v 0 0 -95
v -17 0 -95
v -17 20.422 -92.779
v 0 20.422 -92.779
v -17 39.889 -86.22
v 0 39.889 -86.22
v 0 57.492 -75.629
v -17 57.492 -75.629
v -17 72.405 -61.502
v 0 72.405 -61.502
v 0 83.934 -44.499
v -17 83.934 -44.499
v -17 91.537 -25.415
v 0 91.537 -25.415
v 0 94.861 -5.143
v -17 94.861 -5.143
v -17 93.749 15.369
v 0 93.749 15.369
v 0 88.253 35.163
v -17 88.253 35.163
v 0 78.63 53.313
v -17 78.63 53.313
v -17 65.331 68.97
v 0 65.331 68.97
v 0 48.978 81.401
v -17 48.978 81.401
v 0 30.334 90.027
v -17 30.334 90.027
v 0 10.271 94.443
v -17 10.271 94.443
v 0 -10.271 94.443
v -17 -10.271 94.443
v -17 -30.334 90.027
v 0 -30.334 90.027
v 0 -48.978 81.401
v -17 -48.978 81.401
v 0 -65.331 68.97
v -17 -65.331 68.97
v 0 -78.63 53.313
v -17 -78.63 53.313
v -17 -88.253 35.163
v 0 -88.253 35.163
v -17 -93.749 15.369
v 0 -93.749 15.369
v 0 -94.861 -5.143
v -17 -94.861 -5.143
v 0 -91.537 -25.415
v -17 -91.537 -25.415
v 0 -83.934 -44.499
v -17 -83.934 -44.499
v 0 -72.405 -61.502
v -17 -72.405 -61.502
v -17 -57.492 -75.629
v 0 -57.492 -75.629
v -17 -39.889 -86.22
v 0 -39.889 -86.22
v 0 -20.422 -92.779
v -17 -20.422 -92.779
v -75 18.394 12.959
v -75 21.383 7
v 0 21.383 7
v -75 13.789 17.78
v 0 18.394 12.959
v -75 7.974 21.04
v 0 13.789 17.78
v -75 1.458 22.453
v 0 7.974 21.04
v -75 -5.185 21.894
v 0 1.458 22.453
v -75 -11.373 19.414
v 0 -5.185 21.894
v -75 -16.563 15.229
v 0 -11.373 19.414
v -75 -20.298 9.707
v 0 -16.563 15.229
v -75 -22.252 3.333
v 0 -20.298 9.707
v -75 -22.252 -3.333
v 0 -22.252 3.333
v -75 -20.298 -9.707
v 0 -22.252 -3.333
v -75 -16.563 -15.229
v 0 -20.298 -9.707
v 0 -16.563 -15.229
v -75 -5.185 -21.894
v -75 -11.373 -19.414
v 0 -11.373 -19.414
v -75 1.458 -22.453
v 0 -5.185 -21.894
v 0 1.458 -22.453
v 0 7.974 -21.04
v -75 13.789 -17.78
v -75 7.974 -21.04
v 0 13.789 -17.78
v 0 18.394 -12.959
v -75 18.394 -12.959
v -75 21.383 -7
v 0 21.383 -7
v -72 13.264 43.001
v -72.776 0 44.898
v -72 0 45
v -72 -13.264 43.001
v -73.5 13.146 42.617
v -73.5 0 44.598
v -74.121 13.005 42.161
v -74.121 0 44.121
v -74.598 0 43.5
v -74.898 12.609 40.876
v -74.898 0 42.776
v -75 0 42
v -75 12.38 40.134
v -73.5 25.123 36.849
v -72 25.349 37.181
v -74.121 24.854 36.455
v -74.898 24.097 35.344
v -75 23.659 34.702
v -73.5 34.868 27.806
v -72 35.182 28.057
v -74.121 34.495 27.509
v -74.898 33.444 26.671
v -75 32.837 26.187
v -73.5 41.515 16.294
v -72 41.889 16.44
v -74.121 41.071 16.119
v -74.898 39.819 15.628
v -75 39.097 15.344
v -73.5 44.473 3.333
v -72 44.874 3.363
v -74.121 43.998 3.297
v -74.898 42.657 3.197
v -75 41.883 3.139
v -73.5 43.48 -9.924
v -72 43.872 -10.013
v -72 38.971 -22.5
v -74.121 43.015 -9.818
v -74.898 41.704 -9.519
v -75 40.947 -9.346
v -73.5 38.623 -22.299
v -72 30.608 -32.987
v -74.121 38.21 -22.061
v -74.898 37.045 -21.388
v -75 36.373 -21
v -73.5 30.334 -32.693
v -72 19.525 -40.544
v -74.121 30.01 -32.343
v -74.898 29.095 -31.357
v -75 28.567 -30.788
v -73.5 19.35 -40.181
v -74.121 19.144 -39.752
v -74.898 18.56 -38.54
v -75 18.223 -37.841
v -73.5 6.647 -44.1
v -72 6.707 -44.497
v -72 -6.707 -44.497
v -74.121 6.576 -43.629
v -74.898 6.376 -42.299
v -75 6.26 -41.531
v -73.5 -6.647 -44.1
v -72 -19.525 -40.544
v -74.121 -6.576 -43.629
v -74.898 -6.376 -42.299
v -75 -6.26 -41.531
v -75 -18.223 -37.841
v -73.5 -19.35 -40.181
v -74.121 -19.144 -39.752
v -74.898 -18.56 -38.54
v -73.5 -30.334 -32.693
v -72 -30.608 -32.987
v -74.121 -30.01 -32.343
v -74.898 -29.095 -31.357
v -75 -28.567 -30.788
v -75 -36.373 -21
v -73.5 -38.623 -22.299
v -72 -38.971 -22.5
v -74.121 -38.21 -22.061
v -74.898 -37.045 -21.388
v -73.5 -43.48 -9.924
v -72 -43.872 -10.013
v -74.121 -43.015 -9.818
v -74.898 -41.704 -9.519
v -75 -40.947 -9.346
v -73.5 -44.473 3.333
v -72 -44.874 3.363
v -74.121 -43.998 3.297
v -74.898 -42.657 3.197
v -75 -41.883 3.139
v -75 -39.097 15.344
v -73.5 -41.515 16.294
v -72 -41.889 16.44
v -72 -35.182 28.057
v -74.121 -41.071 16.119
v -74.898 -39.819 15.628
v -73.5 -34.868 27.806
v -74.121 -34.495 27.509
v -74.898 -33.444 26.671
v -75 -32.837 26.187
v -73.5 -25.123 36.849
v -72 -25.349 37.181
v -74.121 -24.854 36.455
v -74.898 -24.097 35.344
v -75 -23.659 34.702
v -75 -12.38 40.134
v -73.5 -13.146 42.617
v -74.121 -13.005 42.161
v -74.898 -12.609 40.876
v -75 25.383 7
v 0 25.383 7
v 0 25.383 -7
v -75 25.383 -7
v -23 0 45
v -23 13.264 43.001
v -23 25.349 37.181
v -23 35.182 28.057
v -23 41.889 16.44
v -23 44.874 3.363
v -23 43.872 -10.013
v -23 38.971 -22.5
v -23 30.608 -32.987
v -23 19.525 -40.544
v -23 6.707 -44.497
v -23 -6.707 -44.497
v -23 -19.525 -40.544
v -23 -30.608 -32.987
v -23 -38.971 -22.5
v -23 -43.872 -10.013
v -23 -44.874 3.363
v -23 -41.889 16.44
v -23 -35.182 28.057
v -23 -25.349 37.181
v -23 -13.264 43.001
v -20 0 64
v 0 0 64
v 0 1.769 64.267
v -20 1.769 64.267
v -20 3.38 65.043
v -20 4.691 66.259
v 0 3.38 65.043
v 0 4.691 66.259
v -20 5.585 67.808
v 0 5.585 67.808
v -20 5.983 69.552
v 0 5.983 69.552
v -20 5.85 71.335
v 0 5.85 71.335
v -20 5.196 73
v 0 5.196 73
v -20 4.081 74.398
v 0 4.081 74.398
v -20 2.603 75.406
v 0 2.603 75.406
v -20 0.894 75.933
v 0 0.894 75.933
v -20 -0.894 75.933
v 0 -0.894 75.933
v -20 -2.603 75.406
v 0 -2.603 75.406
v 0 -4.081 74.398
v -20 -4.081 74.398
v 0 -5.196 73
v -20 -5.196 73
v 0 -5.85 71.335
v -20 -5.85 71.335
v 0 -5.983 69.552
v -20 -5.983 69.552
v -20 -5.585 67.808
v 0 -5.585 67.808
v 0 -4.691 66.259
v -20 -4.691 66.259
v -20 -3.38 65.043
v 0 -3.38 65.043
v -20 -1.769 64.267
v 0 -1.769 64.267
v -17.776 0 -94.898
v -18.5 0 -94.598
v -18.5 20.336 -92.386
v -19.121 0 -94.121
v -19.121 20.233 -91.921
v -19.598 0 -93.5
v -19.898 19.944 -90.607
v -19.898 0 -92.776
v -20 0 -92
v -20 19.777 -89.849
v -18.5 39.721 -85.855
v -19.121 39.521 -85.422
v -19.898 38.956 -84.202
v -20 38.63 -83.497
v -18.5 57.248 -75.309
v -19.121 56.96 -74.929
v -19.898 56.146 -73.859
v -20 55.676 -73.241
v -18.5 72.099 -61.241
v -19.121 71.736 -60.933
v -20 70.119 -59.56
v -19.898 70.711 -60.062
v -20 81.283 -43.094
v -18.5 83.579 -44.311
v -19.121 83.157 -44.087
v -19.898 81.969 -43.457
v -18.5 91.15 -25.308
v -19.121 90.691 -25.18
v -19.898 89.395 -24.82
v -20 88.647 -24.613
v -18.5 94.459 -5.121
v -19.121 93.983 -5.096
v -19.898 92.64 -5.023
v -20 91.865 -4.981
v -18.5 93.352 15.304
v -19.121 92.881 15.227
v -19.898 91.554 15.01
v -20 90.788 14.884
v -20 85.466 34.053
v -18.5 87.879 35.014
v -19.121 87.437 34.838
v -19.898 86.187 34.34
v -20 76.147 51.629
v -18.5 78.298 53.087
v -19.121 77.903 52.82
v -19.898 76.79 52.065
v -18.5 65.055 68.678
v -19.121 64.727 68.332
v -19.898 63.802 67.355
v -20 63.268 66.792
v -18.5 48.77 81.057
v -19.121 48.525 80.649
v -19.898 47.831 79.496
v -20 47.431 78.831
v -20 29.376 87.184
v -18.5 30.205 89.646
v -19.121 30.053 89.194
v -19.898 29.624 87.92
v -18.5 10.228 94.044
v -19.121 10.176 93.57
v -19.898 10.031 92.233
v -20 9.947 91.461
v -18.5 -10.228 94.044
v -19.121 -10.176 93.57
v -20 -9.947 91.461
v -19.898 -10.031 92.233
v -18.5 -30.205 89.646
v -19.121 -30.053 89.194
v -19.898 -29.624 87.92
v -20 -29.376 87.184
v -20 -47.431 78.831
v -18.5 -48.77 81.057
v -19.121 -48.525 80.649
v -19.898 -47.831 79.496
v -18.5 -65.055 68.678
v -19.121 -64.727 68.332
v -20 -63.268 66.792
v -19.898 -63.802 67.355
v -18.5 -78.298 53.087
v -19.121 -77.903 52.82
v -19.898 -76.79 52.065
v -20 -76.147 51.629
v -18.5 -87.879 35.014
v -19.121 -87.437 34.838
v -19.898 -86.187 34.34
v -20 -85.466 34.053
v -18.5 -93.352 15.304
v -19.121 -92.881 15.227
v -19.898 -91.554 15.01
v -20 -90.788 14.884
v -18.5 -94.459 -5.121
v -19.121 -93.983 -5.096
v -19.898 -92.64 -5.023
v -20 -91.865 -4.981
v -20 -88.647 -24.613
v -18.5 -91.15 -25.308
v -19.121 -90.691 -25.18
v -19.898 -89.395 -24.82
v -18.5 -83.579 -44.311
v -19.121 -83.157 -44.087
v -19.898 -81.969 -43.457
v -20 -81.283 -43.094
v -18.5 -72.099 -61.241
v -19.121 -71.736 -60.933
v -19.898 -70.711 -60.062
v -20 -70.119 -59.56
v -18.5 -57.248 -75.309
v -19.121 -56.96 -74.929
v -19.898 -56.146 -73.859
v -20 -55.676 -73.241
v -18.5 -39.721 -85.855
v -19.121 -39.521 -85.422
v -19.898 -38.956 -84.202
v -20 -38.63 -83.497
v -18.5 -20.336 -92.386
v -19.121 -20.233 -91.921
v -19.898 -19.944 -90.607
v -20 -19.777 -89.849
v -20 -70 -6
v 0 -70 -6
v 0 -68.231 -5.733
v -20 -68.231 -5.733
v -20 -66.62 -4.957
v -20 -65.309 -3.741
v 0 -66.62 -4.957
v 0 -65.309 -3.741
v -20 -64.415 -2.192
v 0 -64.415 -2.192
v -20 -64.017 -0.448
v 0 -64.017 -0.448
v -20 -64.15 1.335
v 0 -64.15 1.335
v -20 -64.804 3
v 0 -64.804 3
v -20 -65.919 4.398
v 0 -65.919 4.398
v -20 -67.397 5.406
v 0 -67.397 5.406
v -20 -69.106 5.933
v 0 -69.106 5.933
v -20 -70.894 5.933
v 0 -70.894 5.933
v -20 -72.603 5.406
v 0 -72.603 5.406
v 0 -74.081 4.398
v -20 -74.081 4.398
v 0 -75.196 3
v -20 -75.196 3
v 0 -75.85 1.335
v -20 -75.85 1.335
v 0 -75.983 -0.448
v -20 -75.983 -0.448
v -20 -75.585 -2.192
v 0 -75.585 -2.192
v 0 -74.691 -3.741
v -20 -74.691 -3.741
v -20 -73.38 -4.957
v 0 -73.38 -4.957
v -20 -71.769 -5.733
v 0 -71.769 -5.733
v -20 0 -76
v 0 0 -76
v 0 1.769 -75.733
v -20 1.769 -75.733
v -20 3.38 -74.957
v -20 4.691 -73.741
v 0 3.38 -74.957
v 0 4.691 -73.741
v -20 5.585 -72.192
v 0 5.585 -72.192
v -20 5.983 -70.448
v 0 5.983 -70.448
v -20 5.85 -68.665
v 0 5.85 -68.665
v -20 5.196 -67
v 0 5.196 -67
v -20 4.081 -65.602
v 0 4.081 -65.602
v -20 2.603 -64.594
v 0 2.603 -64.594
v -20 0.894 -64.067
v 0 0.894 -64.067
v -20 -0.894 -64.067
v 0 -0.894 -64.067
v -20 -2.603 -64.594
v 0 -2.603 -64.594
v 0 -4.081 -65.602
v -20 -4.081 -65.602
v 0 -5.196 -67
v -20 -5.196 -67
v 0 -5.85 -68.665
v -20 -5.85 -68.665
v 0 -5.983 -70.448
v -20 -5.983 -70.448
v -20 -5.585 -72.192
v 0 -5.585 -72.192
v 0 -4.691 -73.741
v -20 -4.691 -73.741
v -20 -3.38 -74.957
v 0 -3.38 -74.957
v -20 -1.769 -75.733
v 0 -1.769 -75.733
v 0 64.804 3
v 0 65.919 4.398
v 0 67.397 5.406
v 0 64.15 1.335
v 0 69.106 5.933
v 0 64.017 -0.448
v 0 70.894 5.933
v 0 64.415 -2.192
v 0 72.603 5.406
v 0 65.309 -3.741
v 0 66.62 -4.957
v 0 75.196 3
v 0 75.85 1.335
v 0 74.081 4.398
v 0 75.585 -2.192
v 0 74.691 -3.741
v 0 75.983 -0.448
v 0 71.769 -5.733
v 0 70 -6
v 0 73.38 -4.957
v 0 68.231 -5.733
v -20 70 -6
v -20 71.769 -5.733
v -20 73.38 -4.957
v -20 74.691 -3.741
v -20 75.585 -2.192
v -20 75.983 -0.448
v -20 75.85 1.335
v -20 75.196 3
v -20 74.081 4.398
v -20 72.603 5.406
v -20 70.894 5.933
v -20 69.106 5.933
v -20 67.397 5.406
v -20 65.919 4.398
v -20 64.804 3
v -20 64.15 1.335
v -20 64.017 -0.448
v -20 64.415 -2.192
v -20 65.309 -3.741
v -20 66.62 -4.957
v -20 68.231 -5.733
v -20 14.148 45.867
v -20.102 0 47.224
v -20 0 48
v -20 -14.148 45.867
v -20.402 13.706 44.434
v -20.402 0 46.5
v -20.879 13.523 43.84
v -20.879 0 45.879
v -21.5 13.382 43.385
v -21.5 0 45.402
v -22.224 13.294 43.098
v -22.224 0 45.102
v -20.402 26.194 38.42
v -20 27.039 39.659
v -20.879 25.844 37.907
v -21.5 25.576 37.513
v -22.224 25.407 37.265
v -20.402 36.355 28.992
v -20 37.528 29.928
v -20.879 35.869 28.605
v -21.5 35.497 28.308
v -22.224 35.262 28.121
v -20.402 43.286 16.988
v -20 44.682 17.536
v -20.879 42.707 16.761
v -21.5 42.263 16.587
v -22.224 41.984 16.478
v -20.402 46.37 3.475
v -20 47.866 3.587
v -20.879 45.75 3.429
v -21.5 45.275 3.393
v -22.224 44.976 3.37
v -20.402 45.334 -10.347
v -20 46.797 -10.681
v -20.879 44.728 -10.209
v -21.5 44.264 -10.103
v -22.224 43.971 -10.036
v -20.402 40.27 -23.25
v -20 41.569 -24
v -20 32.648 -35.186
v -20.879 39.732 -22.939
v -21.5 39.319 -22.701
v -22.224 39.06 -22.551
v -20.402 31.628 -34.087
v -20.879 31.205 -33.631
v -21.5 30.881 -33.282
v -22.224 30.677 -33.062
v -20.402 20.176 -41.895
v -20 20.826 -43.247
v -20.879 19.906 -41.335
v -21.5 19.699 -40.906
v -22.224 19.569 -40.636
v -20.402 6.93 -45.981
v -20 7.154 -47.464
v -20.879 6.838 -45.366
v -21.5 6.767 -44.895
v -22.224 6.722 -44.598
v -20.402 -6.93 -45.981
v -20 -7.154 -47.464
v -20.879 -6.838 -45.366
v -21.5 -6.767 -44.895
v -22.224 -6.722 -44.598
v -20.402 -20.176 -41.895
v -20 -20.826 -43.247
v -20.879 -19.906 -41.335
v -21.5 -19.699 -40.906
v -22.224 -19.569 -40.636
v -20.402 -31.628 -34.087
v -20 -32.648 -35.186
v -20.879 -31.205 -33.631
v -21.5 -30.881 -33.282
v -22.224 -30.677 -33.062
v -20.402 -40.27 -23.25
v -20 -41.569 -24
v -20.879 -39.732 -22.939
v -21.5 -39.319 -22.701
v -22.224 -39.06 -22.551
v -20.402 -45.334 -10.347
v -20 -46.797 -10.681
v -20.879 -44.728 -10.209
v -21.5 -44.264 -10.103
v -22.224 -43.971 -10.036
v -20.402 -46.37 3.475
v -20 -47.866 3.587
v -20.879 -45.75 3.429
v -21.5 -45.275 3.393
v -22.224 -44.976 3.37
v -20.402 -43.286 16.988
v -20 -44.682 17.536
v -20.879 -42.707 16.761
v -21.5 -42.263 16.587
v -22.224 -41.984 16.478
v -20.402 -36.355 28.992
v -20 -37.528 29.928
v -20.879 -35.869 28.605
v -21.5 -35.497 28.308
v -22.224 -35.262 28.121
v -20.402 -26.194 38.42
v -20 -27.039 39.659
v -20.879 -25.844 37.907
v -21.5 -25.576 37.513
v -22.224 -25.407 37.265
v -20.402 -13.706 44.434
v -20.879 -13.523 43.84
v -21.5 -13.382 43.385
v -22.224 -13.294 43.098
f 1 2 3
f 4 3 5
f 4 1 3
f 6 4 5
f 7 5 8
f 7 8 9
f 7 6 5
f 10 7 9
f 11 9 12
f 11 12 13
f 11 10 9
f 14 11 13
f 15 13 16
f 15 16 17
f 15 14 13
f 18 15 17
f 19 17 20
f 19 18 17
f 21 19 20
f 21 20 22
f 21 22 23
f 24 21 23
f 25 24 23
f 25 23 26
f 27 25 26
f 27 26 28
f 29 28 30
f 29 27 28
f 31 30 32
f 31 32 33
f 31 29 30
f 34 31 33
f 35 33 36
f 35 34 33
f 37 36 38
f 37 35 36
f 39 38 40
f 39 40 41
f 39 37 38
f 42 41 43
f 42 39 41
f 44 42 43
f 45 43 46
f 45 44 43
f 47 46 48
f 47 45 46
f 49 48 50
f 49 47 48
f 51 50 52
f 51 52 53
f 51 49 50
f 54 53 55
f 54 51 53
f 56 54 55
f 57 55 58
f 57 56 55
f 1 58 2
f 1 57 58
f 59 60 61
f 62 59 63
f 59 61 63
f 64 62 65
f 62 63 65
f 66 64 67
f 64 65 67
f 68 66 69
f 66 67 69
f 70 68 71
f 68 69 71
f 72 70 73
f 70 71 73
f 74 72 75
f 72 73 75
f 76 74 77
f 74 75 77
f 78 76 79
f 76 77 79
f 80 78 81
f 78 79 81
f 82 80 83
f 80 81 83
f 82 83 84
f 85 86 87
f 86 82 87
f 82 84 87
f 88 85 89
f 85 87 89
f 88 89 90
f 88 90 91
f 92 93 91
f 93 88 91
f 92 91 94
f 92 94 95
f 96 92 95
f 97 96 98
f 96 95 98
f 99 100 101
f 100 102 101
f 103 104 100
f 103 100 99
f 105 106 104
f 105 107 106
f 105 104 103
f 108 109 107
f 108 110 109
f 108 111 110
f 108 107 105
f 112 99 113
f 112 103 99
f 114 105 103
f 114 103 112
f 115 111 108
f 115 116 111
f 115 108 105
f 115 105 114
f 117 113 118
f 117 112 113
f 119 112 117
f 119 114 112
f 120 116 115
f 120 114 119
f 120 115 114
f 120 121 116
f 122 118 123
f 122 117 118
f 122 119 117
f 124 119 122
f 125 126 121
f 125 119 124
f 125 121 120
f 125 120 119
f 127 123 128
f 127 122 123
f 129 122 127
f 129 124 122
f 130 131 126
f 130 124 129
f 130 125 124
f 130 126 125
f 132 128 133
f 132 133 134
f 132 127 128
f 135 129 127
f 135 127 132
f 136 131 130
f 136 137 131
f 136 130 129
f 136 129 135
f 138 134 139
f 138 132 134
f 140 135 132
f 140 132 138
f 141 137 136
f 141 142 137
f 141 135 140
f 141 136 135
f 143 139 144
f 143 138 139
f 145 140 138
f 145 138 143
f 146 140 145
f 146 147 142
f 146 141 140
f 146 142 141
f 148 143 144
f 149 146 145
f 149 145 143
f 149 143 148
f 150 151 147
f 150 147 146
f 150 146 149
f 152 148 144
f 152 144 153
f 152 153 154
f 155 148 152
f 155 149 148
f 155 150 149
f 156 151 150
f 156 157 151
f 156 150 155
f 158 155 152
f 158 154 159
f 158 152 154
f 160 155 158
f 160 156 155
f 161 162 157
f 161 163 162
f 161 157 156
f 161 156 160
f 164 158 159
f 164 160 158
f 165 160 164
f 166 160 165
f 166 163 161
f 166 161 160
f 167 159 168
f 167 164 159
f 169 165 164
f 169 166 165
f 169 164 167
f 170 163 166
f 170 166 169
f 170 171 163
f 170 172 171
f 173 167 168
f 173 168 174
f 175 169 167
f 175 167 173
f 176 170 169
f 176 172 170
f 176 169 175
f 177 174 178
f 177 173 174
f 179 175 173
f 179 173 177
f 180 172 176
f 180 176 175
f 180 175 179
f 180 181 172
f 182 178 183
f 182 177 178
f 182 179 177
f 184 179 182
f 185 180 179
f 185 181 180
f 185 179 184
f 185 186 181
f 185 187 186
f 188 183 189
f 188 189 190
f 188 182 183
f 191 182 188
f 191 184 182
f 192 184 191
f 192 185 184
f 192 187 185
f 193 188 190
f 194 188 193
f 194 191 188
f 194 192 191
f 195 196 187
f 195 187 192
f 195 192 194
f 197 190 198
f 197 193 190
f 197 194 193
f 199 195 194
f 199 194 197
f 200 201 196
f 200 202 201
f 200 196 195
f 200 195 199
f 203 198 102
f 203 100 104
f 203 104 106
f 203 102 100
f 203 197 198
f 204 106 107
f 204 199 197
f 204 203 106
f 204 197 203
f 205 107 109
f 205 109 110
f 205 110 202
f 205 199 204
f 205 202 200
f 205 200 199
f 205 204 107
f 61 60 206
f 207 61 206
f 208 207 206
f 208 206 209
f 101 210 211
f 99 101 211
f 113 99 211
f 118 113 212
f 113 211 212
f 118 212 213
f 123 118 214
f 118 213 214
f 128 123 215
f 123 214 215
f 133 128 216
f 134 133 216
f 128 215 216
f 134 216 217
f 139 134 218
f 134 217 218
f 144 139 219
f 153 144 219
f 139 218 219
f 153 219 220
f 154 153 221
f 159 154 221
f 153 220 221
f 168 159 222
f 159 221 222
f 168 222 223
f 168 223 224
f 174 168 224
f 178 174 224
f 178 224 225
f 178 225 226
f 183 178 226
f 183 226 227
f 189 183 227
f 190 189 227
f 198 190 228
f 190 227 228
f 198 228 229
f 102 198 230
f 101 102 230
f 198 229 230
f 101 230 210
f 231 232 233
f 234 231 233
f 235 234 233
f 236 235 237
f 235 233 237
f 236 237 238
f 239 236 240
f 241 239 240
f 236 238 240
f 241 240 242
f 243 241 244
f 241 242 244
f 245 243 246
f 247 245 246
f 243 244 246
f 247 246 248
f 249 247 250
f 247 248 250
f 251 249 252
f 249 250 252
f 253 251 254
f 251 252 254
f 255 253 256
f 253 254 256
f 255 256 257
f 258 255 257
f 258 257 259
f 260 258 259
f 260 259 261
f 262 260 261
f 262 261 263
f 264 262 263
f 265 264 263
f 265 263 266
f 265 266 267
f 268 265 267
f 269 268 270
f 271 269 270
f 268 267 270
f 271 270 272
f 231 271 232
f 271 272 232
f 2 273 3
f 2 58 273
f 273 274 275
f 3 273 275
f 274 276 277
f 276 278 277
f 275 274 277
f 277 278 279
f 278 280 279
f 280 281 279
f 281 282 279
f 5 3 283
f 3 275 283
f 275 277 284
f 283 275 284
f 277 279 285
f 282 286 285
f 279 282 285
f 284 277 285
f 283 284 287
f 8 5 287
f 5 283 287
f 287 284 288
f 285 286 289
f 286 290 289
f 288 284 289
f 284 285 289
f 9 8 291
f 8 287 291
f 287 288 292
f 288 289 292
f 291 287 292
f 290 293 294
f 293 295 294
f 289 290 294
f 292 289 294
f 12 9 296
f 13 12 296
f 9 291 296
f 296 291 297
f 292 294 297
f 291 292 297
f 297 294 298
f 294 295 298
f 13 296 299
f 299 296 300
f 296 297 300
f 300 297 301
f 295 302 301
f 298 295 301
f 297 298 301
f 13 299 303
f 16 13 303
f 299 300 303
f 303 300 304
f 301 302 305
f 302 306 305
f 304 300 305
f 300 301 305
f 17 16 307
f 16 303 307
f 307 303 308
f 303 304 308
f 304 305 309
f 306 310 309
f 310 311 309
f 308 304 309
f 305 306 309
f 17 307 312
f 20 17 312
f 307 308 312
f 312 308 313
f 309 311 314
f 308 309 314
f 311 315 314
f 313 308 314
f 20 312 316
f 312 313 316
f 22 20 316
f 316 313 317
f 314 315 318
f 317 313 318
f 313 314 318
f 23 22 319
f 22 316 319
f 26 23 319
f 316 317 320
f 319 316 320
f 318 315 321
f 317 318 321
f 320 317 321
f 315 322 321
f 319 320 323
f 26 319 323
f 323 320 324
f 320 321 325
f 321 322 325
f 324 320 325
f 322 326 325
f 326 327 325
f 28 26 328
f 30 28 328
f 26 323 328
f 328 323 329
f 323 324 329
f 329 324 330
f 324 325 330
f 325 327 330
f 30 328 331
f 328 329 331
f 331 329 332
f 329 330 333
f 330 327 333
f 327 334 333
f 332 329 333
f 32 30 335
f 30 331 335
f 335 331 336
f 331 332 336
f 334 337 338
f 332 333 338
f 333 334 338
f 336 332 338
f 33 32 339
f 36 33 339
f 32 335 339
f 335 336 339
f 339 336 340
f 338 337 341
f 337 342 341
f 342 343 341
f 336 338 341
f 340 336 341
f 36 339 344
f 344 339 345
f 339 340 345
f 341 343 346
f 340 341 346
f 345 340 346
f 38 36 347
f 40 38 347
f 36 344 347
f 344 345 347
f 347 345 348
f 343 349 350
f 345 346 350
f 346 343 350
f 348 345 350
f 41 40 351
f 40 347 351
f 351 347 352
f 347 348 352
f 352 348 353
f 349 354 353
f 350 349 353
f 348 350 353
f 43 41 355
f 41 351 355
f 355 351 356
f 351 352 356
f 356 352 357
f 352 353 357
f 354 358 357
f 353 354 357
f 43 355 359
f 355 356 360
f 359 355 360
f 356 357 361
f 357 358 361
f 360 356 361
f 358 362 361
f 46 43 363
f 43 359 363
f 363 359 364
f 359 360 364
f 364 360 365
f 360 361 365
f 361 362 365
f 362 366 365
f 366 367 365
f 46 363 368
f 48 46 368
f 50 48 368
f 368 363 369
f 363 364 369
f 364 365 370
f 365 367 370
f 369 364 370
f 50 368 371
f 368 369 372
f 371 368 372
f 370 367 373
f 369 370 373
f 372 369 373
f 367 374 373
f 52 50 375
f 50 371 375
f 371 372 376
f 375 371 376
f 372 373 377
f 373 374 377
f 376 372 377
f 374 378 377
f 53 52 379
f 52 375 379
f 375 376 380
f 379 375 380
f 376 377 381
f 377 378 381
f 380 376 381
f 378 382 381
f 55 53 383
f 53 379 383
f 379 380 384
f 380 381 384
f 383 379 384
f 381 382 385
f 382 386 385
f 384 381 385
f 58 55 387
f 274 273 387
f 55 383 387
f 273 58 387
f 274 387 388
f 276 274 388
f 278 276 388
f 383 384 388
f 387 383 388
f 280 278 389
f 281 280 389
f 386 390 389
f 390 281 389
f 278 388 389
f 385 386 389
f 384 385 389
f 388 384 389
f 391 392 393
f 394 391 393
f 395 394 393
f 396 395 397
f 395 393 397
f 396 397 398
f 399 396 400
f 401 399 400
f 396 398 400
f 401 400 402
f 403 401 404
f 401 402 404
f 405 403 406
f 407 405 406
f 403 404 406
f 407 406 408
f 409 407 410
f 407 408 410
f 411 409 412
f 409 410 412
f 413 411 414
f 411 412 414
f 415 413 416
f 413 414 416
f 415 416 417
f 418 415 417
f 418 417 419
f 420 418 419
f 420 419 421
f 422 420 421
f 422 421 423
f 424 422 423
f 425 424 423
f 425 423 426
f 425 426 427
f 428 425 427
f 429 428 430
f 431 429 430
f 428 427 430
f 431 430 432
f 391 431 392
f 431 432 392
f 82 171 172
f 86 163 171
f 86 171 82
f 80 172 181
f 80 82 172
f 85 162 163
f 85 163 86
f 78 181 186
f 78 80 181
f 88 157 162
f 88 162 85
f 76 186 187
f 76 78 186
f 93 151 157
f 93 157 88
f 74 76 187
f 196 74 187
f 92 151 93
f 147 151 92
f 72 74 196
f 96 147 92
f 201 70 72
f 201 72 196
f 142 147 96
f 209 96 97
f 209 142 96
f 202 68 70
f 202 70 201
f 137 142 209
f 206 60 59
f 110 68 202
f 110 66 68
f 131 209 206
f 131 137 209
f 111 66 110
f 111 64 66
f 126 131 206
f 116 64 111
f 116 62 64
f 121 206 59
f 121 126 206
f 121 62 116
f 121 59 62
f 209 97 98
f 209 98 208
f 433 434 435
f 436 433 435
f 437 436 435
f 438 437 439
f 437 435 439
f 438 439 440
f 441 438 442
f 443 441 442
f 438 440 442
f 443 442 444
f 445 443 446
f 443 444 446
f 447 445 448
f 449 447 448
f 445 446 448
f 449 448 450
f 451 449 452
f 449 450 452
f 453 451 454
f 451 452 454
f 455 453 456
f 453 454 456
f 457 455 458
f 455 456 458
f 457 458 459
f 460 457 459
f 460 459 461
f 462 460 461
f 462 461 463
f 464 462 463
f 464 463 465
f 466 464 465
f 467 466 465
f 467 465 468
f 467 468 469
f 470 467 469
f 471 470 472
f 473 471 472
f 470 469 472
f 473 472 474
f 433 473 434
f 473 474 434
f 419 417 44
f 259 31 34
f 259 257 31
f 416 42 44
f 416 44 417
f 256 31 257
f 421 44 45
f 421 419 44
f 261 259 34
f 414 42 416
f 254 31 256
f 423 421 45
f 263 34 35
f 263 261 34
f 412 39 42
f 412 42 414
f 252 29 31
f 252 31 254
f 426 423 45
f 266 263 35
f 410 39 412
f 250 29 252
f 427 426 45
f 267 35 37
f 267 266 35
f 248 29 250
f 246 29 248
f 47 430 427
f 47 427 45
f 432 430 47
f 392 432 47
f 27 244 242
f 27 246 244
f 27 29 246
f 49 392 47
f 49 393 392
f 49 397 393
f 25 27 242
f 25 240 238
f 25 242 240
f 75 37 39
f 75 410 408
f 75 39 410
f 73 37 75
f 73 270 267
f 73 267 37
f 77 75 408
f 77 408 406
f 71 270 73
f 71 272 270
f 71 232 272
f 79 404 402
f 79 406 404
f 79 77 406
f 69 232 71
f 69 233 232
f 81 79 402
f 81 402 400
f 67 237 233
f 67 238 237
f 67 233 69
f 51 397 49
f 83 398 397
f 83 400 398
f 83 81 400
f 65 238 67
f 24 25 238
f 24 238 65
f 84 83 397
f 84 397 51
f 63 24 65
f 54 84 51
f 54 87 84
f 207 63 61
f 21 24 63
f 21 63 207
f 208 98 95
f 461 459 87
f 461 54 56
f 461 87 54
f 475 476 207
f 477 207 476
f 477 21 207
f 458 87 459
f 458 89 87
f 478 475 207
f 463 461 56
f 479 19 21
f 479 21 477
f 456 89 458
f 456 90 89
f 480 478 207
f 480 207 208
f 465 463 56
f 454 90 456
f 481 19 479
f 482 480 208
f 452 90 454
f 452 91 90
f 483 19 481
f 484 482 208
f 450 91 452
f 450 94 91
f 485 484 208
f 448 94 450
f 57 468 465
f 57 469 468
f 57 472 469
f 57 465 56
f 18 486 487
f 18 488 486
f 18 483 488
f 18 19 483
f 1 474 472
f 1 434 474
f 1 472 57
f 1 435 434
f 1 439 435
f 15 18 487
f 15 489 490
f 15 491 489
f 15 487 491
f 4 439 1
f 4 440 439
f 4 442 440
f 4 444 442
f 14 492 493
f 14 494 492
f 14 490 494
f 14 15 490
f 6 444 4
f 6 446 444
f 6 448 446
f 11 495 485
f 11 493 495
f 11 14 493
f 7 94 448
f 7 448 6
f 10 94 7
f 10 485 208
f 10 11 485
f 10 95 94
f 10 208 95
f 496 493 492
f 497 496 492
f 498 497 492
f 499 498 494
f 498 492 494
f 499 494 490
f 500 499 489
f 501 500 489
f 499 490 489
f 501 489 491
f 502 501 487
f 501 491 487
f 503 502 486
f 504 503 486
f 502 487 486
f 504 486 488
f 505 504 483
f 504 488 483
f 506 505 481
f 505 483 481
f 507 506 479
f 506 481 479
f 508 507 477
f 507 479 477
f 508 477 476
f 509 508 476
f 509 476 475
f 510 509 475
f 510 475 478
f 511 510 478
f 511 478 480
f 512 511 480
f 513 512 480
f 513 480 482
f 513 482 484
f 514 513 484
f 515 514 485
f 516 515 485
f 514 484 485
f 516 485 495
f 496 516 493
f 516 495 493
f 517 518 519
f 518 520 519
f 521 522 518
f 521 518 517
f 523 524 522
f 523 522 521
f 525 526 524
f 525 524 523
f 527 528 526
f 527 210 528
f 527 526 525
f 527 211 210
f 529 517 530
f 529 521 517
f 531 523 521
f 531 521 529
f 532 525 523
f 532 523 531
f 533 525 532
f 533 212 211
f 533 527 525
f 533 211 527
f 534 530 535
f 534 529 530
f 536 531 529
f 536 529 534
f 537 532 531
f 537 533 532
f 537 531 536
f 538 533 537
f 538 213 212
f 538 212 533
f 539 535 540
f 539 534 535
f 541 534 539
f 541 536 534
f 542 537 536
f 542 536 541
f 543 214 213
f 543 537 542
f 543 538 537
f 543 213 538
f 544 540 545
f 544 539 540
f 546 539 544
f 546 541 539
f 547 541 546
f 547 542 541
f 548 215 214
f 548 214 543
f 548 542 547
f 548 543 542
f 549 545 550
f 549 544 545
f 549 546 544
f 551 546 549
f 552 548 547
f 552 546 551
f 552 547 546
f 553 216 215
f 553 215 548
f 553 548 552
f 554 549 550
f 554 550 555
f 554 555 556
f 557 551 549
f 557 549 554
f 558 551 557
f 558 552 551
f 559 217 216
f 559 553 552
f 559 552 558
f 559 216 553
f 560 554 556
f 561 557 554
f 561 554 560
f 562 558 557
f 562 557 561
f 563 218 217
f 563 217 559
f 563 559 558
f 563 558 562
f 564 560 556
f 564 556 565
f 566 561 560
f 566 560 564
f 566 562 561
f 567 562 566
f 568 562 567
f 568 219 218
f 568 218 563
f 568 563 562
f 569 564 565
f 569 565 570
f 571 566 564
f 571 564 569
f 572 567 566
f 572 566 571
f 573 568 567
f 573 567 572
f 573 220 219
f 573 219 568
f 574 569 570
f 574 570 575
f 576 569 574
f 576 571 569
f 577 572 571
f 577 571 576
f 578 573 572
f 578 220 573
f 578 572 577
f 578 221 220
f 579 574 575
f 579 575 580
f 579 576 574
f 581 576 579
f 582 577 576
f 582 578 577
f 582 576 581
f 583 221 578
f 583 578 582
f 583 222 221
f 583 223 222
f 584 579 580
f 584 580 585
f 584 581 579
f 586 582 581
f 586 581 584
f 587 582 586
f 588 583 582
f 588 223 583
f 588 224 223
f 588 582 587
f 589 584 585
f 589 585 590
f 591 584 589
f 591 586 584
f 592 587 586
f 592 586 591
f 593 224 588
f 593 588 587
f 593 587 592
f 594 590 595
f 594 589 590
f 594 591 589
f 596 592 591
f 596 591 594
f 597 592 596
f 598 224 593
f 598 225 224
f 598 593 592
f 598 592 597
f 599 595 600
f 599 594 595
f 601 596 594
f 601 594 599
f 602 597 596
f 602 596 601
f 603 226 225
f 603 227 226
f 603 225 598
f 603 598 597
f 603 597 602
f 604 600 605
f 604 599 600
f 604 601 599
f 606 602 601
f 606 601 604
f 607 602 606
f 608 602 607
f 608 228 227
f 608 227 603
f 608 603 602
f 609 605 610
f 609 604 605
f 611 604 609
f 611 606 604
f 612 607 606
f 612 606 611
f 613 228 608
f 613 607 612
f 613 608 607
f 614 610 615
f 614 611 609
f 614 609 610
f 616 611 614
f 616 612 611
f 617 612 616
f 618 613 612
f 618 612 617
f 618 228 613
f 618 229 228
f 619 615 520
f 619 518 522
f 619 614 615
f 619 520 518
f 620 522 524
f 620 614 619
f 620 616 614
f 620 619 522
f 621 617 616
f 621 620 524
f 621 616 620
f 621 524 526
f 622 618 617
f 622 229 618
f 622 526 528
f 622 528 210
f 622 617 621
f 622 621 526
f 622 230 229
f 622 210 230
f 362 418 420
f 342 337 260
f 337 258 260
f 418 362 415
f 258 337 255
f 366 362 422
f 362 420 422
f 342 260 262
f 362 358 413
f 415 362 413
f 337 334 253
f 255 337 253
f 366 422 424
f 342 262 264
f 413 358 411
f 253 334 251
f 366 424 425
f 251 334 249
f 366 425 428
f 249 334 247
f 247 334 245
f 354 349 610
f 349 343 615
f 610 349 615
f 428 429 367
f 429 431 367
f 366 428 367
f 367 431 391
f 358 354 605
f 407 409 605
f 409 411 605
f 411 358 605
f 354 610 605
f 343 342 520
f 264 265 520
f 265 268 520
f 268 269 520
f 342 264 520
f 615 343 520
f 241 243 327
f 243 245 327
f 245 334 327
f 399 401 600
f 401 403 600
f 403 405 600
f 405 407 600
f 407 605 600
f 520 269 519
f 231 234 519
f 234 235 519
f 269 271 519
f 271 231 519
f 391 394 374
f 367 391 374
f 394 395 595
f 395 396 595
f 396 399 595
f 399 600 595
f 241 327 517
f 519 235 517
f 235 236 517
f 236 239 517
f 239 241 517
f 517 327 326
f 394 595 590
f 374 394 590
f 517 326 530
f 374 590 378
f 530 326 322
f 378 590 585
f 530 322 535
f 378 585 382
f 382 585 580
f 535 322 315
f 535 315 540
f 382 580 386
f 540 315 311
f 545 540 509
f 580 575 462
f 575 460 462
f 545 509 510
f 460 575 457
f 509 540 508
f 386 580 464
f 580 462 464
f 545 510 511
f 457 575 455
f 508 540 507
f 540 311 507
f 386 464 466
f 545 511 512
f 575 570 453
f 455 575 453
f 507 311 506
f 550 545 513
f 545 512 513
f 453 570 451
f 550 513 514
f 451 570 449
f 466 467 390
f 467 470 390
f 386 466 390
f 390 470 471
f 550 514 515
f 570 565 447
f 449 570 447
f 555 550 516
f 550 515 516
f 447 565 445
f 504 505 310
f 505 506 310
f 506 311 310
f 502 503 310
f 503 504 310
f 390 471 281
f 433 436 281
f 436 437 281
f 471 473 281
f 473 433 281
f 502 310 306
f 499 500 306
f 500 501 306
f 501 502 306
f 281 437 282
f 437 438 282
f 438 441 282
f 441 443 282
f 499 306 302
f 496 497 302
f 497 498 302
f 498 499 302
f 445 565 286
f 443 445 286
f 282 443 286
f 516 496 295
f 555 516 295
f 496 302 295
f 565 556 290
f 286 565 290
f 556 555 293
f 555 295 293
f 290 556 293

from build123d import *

# Parameters (mm, degrees)
SKETCH1_R           = 95
BOSS_EXTRUDE1_DEPTH = 20
SKETCH2_R           = 45
BOSS_EXTRUDE2_DEPTH = 55
SKETCH4_R           = 22.5
CUT_EXTRUDE1_DEPTH  = 75
SKETCH5_R           = 6
CUT_EXTRUDE2_DEPTH  = 20
SKETCH6_W           = 14
SKETCH6_H           = 4
CUT_EXTRUDE3_DEPTH  = 154.866825534
FILLET1_R           = 3


with BuildPart() as part:
    # Sketch1 → Boss-Extrude1 (new body)
    with BuildSketch(Plane(origin=(0, 0, 0), x_dir=(0, 0, -1), z_dir=(1, 0, 0))):
        Circle(SKETCH1_R)
    extrude(amount=-BOSS_EXTRUDE1_DEPTH)

    # Sketch2 → Boss-Extrude2 (add)
    with BuildSketch(Plane.ZY.offset(20)):
        Circle(SKETCH2_R)
    extrude(amount=BOSS_EXTRUDE2_DEPTH)

    # Sketch4 → Cut-Extrude1 (cut)
    with BuildSketch(Plane(origin=(0, 0, 0), x_dir=(0, 0, -1), z_dir=(1, 0, 0))):
        Circle(SKETCH4_R)
    extrude(amount=-CUT_EXTRUDE1_DEPTH, mode=Mode.SUBTRACT)

    # Sketch5 → Cut-Extrude2 (cut)
    with BuildSketch(Plane(origin=(0, 0, 0), x_dir=(0, 0, -1), z_dir=(1, 0, 0))):
        with Locations((0, 70)):
            Circle(SKETCH5_R)
        with Locations((70, 0)):
            Circle(SKETCH5_R)
        with Locations((0, -70)):
            Circle(SKETCH5_R)
        with Locations((-70, 0)):
            Circle(SKETCH5_R)
    extrude(amount=-CUT_EXTRUDE2_DEPTH, mode=Mode.SUBTRACT)

    # Sketch6 → Cut-Extrude3 (cut, through all)
    with BuildSketch(Plane(origin=(0, 0, 0), x_dir=(0, 0, -1), z_dir=(1, 0, 0))):
        with Locations((0, 23.38340478)):
            Rectangle(SKETCH6_W, SKETCH6_H)
    extrude(amount=-CUT_EXTRUDE3_DEPTH, mode=Mode.SUBTRACT)

    # Fillet1
    fillet1_edges = [part.edges().sort_by_distance(p)[0] for p in [
        (-20, 0, 95),
        (-20, 0, -45),
        (-75, 0, -45),
    ]]
    fillet(fillet1_edges, radius=FILLET1_R)


solid = part.part
